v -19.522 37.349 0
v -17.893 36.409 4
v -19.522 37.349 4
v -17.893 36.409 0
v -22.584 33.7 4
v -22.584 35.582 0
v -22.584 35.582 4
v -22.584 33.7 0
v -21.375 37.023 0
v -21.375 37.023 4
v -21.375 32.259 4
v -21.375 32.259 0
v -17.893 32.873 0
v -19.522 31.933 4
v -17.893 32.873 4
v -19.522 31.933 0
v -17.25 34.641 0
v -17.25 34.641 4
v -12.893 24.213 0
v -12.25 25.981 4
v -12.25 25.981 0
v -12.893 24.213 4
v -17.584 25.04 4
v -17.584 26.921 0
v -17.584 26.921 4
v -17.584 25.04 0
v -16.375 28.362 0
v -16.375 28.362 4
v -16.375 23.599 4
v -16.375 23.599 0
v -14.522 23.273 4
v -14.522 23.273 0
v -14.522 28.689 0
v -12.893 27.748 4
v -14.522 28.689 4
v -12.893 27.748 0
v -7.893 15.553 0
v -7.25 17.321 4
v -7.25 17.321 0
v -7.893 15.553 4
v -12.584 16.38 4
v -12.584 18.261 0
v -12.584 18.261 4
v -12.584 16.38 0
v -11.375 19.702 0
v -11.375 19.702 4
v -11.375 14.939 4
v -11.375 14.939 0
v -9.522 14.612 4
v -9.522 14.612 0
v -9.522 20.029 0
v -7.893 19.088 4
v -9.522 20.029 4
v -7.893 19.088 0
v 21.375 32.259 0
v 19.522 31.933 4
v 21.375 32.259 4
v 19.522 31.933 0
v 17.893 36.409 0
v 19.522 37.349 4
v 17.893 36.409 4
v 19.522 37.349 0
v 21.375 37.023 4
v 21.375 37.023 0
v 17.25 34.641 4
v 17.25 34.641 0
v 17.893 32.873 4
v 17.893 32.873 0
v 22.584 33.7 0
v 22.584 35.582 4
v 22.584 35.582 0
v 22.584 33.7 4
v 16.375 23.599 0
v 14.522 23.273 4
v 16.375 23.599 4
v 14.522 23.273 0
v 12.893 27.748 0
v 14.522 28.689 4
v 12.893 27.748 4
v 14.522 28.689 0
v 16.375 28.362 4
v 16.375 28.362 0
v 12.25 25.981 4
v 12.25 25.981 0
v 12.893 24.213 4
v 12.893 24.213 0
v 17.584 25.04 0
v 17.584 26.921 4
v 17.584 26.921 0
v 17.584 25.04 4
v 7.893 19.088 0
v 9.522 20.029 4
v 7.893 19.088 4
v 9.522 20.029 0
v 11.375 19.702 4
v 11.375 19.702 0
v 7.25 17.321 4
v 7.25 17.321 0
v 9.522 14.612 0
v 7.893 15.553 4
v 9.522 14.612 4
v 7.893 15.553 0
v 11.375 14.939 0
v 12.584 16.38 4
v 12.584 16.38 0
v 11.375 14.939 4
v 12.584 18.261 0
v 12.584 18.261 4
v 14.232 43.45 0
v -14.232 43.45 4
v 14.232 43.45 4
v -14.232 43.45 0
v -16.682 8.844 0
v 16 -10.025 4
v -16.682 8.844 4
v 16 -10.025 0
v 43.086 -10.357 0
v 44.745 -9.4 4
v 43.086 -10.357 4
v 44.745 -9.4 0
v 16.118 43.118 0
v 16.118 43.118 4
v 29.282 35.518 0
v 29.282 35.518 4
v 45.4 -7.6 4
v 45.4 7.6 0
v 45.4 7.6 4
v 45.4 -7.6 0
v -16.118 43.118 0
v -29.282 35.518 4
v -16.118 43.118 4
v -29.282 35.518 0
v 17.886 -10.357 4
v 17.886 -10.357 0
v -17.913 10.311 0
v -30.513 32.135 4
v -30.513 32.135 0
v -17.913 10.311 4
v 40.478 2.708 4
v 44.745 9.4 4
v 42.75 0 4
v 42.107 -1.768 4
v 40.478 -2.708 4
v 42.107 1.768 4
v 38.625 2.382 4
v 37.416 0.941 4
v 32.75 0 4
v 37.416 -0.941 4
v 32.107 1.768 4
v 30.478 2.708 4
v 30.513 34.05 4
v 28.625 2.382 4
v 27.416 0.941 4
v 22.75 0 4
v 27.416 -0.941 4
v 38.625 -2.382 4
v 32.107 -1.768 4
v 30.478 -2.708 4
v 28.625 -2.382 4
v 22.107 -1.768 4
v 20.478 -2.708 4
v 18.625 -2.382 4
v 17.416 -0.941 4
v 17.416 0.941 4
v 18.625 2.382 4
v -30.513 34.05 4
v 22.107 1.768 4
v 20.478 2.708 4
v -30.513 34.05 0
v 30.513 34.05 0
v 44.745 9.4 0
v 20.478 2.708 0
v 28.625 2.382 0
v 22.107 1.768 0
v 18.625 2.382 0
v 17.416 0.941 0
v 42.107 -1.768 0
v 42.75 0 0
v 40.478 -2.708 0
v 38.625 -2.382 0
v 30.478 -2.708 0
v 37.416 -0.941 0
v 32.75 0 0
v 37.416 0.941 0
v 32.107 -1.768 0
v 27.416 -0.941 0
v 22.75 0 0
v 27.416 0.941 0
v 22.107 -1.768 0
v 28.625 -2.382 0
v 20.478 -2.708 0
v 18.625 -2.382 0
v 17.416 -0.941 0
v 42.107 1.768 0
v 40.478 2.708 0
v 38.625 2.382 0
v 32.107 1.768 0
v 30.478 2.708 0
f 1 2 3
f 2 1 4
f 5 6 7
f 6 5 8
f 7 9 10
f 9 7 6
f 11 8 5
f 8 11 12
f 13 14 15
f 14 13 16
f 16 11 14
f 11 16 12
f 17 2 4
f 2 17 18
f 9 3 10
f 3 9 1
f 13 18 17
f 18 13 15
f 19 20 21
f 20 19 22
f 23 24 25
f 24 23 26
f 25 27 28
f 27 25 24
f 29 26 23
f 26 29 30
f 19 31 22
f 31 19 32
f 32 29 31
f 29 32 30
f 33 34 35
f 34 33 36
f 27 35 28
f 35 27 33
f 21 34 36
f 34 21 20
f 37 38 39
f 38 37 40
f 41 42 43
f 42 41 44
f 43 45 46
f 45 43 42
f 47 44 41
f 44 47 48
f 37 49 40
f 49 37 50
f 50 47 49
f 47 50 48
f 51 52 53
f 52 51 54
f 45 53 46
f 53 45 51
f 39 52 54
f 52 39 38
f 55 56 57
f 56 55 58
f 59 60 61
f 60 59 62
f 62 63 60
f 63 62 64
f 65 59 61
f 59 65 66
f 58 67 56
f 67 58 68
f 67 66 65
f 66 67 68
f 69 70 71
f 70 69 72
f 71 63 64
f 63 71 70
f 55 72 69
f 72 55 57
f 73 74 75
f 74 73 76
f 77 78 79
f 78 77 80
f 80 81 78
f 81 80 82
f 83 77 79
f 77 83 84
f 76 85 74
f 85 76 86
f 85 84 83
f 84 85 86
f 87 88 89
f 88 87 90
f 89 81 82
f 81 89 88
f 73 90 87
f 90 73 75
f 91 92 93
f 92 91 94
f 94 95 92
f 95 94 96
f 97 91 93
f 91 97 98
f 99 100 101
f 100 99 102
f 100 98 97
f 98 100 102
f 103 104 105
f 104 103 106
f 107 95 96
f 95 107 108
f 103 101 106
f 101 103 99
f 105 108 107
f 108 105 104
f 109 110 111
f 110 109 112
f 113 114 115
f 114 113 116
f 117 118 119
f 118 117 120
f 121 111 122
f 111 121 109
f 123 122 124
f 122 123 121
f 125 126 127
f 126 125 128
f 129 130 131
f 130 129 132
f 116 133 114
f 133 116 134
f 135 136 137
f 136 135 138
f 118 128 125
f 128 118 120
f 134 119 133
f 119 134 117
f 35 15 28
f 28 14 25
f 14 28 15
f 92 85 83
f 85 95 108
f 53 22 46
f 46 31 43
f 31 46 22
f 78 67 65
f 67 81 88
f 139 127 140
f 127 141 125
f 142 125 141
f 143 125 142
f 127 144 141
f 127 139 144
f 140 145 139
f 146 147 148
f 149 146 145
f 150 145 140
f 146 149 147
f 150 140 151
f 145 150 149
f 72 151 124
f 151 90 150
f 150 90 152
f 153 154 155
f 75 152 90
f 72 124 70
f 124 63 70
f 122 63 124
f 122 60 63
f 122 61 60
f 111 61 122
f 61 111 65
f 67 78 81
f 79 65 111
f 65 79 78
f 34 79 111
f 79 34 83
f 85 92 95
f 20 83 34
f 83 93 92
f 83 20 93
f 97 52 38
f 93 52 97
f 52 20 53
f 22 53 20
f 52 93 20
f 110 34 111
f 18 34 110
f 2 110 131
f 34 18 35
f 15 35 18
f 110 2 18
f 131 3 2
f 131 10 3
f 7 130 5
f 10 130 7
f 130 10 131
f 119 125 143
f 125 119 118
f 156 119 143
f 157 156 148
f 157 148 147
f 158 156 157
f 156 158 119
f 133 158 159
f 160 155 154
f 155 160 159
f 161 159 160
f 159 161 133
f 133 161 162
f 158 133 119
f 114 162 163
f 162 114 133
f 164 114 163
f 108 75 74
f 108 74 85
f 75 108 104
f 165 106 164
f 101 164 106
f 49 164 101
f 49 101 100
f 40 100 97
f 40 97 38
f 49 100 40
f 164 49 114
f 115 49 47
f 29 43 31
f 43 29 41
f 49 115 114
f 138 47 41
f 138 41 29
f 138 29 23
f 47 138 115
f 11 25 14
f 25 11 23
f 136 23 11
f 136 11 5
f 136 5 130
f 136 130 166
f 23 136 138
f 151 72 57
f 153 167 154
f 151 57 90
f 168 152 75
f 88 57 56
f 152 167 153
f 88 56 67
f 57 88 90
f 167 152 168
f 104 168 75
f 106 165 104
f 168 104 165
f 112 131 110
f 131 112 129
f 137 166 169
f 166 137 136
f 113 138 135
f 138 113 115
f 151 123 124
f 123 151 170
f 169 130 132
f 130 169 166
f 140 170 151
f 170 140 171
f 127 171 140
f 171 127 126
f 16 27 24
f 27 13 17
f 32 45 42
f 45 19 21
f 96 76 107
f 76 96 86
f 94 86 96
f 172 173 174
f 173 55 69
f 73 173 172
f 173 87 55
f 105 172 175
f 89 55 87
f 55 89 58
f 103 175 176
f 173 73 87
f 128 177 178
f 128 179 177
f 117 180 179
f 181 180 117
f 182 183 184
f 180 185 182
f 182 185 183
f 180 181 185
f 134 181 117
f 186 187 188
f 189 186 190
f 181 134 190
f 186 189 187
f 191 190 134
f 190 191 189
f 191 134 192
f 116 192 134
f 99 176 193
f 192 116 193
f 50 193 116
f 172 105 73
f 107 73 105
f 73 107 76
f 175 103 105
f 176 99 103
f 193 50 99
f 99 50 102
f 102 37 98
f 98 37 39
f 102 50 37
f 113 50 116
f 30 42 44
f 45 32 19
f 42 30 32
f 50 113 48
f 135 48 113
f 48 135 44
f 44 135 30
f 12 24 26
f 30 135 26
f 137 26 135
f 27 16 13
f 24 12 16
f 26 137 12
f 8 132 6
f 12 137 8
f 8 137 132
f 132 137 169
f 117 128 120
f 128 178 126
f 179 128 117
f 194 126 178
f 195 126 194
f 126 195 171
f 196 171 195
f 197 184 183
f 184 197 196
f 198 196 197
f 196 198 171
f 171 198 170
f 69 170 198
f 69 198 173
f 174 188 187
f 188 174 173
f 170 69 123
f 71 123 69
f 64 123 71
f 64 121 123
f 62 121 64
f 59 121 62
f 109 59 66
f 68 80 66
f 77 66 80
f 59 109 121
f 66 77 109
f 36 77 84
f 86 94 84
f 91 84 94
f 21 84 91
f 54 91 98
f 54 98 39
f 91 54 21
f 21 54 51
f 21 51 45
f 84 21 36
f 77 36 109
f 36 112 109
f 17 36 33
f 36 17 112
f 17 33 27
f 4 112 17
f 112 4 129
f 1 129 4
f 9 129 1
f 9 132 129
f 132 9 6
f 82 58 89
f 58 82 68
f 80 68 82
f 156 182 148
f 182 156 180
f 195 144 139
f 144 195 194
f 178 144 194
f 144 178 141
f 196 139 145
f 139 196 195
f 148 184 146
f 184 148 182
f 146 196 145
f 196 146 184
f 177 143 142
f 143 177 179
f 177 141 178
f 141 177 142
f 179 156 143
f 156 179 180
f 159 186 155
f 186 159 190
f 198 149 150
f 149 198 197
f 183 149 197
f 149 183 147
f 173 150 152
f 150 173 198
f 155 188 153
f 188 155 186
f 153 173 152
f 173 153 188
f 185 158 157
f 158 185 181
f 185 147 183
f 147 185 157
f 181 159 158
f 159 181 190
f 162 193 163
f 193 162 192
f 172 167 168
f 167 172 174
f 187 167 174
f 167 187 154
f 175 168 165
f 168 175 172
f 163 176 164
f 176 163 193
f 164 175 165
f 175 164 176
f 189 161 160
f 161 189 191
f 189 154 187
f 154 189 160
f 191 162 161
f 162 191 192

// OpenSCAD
// rob@openpart.co.uk 20140204-03:26
// 9 hole joining plate to connect 3 off 20mm NOMINAL extrusion at 120 degrees
// V-Slot & others

module roundedRect(size, radius) {
	x = size[0];
	y = size[1];
	z = size[2];
	linear_extrude(height=z)
	hull()
	{
		// place 4 circles in the corners, with the given radius
		translate([(-x/2)+(radius/2), (-y/2)+(radius/2), 0])
		circle(r=radius);
		translate([(x/2)-(radius/2), (-y/2)+(radius/2), 0])
		circle(r=radius);
		translate([(-x/2)+(radius/2), (y/2)-(radius/2), 0])
		circle(r=radius);
		translate([(x/2)-(radius/2), (y/2)-(radius/2), 0])
		circle(r=radius);
	}
}
angle = 120;
hole = 5.5 / 2;
plate_width1 = 18;
plate_width2 = 18;
plate_width3 = 18;
plate_length1 = 28;
plate_length2 = 28;
plate_length3 = 28;
plate_thickness = 4;
extend_past_thickness = 2;
corner_radius = 2.8;

difference() {
hull () {
		rotate([0,0,(angle/2)]) {
			translate([30, 0, 0])
				roundedRect ([plate_length1, plate_width1, plate_thickness], corner_radius);
		}
		rotate([0,0,angle]) {
			translate([30, 0, 0])
				roundedRect ([plate_length3, plate_width1, plate_thickness], corner_radius);
		}

		translate([30, 0, 0])
				roundedRect ([plate_length2, plate_width2, plate_thickness], corner_radius);
	}



		rotate([0,0,angle]) {
			translate([40,00,-1])
					cylinder(h = (extend_past_thickness+plate_thickness), r = hole);
			translate([30,0,-1])
					cylinder(h = (extend_past_thickness+plate_thickness), r = hole);
			translate([20,0,-1])
					cylinder(h = (extend_past_thickness+plate_thickness), r = hole);

		}

			translate([40,00,-1])
					cylinder(h = (extend_past_thickness+plate_thickness), r = hole);
			translate([30,0,-1])
					cylinder(h = (extend_past_thickness+plate_thickness), r = hole);
			translate([20,0,-1])
					cylinder(h = (extend_past_thickness+plate_thickness), r = hole);


		rotate([0,0,(angle/2)]) {
			translate([40,00,-1])
					cylinder(h = (extend_past_thickness+plate_thickness), r = hole);
			translate([30,0,-1])
					cylinder(h = (extend_past_thickness+plate_thickness), r = hole);
			translate([20,0,-1])
					cylinder(h = (extend_past_thickness+plate_thickness), r = hole);

}}
